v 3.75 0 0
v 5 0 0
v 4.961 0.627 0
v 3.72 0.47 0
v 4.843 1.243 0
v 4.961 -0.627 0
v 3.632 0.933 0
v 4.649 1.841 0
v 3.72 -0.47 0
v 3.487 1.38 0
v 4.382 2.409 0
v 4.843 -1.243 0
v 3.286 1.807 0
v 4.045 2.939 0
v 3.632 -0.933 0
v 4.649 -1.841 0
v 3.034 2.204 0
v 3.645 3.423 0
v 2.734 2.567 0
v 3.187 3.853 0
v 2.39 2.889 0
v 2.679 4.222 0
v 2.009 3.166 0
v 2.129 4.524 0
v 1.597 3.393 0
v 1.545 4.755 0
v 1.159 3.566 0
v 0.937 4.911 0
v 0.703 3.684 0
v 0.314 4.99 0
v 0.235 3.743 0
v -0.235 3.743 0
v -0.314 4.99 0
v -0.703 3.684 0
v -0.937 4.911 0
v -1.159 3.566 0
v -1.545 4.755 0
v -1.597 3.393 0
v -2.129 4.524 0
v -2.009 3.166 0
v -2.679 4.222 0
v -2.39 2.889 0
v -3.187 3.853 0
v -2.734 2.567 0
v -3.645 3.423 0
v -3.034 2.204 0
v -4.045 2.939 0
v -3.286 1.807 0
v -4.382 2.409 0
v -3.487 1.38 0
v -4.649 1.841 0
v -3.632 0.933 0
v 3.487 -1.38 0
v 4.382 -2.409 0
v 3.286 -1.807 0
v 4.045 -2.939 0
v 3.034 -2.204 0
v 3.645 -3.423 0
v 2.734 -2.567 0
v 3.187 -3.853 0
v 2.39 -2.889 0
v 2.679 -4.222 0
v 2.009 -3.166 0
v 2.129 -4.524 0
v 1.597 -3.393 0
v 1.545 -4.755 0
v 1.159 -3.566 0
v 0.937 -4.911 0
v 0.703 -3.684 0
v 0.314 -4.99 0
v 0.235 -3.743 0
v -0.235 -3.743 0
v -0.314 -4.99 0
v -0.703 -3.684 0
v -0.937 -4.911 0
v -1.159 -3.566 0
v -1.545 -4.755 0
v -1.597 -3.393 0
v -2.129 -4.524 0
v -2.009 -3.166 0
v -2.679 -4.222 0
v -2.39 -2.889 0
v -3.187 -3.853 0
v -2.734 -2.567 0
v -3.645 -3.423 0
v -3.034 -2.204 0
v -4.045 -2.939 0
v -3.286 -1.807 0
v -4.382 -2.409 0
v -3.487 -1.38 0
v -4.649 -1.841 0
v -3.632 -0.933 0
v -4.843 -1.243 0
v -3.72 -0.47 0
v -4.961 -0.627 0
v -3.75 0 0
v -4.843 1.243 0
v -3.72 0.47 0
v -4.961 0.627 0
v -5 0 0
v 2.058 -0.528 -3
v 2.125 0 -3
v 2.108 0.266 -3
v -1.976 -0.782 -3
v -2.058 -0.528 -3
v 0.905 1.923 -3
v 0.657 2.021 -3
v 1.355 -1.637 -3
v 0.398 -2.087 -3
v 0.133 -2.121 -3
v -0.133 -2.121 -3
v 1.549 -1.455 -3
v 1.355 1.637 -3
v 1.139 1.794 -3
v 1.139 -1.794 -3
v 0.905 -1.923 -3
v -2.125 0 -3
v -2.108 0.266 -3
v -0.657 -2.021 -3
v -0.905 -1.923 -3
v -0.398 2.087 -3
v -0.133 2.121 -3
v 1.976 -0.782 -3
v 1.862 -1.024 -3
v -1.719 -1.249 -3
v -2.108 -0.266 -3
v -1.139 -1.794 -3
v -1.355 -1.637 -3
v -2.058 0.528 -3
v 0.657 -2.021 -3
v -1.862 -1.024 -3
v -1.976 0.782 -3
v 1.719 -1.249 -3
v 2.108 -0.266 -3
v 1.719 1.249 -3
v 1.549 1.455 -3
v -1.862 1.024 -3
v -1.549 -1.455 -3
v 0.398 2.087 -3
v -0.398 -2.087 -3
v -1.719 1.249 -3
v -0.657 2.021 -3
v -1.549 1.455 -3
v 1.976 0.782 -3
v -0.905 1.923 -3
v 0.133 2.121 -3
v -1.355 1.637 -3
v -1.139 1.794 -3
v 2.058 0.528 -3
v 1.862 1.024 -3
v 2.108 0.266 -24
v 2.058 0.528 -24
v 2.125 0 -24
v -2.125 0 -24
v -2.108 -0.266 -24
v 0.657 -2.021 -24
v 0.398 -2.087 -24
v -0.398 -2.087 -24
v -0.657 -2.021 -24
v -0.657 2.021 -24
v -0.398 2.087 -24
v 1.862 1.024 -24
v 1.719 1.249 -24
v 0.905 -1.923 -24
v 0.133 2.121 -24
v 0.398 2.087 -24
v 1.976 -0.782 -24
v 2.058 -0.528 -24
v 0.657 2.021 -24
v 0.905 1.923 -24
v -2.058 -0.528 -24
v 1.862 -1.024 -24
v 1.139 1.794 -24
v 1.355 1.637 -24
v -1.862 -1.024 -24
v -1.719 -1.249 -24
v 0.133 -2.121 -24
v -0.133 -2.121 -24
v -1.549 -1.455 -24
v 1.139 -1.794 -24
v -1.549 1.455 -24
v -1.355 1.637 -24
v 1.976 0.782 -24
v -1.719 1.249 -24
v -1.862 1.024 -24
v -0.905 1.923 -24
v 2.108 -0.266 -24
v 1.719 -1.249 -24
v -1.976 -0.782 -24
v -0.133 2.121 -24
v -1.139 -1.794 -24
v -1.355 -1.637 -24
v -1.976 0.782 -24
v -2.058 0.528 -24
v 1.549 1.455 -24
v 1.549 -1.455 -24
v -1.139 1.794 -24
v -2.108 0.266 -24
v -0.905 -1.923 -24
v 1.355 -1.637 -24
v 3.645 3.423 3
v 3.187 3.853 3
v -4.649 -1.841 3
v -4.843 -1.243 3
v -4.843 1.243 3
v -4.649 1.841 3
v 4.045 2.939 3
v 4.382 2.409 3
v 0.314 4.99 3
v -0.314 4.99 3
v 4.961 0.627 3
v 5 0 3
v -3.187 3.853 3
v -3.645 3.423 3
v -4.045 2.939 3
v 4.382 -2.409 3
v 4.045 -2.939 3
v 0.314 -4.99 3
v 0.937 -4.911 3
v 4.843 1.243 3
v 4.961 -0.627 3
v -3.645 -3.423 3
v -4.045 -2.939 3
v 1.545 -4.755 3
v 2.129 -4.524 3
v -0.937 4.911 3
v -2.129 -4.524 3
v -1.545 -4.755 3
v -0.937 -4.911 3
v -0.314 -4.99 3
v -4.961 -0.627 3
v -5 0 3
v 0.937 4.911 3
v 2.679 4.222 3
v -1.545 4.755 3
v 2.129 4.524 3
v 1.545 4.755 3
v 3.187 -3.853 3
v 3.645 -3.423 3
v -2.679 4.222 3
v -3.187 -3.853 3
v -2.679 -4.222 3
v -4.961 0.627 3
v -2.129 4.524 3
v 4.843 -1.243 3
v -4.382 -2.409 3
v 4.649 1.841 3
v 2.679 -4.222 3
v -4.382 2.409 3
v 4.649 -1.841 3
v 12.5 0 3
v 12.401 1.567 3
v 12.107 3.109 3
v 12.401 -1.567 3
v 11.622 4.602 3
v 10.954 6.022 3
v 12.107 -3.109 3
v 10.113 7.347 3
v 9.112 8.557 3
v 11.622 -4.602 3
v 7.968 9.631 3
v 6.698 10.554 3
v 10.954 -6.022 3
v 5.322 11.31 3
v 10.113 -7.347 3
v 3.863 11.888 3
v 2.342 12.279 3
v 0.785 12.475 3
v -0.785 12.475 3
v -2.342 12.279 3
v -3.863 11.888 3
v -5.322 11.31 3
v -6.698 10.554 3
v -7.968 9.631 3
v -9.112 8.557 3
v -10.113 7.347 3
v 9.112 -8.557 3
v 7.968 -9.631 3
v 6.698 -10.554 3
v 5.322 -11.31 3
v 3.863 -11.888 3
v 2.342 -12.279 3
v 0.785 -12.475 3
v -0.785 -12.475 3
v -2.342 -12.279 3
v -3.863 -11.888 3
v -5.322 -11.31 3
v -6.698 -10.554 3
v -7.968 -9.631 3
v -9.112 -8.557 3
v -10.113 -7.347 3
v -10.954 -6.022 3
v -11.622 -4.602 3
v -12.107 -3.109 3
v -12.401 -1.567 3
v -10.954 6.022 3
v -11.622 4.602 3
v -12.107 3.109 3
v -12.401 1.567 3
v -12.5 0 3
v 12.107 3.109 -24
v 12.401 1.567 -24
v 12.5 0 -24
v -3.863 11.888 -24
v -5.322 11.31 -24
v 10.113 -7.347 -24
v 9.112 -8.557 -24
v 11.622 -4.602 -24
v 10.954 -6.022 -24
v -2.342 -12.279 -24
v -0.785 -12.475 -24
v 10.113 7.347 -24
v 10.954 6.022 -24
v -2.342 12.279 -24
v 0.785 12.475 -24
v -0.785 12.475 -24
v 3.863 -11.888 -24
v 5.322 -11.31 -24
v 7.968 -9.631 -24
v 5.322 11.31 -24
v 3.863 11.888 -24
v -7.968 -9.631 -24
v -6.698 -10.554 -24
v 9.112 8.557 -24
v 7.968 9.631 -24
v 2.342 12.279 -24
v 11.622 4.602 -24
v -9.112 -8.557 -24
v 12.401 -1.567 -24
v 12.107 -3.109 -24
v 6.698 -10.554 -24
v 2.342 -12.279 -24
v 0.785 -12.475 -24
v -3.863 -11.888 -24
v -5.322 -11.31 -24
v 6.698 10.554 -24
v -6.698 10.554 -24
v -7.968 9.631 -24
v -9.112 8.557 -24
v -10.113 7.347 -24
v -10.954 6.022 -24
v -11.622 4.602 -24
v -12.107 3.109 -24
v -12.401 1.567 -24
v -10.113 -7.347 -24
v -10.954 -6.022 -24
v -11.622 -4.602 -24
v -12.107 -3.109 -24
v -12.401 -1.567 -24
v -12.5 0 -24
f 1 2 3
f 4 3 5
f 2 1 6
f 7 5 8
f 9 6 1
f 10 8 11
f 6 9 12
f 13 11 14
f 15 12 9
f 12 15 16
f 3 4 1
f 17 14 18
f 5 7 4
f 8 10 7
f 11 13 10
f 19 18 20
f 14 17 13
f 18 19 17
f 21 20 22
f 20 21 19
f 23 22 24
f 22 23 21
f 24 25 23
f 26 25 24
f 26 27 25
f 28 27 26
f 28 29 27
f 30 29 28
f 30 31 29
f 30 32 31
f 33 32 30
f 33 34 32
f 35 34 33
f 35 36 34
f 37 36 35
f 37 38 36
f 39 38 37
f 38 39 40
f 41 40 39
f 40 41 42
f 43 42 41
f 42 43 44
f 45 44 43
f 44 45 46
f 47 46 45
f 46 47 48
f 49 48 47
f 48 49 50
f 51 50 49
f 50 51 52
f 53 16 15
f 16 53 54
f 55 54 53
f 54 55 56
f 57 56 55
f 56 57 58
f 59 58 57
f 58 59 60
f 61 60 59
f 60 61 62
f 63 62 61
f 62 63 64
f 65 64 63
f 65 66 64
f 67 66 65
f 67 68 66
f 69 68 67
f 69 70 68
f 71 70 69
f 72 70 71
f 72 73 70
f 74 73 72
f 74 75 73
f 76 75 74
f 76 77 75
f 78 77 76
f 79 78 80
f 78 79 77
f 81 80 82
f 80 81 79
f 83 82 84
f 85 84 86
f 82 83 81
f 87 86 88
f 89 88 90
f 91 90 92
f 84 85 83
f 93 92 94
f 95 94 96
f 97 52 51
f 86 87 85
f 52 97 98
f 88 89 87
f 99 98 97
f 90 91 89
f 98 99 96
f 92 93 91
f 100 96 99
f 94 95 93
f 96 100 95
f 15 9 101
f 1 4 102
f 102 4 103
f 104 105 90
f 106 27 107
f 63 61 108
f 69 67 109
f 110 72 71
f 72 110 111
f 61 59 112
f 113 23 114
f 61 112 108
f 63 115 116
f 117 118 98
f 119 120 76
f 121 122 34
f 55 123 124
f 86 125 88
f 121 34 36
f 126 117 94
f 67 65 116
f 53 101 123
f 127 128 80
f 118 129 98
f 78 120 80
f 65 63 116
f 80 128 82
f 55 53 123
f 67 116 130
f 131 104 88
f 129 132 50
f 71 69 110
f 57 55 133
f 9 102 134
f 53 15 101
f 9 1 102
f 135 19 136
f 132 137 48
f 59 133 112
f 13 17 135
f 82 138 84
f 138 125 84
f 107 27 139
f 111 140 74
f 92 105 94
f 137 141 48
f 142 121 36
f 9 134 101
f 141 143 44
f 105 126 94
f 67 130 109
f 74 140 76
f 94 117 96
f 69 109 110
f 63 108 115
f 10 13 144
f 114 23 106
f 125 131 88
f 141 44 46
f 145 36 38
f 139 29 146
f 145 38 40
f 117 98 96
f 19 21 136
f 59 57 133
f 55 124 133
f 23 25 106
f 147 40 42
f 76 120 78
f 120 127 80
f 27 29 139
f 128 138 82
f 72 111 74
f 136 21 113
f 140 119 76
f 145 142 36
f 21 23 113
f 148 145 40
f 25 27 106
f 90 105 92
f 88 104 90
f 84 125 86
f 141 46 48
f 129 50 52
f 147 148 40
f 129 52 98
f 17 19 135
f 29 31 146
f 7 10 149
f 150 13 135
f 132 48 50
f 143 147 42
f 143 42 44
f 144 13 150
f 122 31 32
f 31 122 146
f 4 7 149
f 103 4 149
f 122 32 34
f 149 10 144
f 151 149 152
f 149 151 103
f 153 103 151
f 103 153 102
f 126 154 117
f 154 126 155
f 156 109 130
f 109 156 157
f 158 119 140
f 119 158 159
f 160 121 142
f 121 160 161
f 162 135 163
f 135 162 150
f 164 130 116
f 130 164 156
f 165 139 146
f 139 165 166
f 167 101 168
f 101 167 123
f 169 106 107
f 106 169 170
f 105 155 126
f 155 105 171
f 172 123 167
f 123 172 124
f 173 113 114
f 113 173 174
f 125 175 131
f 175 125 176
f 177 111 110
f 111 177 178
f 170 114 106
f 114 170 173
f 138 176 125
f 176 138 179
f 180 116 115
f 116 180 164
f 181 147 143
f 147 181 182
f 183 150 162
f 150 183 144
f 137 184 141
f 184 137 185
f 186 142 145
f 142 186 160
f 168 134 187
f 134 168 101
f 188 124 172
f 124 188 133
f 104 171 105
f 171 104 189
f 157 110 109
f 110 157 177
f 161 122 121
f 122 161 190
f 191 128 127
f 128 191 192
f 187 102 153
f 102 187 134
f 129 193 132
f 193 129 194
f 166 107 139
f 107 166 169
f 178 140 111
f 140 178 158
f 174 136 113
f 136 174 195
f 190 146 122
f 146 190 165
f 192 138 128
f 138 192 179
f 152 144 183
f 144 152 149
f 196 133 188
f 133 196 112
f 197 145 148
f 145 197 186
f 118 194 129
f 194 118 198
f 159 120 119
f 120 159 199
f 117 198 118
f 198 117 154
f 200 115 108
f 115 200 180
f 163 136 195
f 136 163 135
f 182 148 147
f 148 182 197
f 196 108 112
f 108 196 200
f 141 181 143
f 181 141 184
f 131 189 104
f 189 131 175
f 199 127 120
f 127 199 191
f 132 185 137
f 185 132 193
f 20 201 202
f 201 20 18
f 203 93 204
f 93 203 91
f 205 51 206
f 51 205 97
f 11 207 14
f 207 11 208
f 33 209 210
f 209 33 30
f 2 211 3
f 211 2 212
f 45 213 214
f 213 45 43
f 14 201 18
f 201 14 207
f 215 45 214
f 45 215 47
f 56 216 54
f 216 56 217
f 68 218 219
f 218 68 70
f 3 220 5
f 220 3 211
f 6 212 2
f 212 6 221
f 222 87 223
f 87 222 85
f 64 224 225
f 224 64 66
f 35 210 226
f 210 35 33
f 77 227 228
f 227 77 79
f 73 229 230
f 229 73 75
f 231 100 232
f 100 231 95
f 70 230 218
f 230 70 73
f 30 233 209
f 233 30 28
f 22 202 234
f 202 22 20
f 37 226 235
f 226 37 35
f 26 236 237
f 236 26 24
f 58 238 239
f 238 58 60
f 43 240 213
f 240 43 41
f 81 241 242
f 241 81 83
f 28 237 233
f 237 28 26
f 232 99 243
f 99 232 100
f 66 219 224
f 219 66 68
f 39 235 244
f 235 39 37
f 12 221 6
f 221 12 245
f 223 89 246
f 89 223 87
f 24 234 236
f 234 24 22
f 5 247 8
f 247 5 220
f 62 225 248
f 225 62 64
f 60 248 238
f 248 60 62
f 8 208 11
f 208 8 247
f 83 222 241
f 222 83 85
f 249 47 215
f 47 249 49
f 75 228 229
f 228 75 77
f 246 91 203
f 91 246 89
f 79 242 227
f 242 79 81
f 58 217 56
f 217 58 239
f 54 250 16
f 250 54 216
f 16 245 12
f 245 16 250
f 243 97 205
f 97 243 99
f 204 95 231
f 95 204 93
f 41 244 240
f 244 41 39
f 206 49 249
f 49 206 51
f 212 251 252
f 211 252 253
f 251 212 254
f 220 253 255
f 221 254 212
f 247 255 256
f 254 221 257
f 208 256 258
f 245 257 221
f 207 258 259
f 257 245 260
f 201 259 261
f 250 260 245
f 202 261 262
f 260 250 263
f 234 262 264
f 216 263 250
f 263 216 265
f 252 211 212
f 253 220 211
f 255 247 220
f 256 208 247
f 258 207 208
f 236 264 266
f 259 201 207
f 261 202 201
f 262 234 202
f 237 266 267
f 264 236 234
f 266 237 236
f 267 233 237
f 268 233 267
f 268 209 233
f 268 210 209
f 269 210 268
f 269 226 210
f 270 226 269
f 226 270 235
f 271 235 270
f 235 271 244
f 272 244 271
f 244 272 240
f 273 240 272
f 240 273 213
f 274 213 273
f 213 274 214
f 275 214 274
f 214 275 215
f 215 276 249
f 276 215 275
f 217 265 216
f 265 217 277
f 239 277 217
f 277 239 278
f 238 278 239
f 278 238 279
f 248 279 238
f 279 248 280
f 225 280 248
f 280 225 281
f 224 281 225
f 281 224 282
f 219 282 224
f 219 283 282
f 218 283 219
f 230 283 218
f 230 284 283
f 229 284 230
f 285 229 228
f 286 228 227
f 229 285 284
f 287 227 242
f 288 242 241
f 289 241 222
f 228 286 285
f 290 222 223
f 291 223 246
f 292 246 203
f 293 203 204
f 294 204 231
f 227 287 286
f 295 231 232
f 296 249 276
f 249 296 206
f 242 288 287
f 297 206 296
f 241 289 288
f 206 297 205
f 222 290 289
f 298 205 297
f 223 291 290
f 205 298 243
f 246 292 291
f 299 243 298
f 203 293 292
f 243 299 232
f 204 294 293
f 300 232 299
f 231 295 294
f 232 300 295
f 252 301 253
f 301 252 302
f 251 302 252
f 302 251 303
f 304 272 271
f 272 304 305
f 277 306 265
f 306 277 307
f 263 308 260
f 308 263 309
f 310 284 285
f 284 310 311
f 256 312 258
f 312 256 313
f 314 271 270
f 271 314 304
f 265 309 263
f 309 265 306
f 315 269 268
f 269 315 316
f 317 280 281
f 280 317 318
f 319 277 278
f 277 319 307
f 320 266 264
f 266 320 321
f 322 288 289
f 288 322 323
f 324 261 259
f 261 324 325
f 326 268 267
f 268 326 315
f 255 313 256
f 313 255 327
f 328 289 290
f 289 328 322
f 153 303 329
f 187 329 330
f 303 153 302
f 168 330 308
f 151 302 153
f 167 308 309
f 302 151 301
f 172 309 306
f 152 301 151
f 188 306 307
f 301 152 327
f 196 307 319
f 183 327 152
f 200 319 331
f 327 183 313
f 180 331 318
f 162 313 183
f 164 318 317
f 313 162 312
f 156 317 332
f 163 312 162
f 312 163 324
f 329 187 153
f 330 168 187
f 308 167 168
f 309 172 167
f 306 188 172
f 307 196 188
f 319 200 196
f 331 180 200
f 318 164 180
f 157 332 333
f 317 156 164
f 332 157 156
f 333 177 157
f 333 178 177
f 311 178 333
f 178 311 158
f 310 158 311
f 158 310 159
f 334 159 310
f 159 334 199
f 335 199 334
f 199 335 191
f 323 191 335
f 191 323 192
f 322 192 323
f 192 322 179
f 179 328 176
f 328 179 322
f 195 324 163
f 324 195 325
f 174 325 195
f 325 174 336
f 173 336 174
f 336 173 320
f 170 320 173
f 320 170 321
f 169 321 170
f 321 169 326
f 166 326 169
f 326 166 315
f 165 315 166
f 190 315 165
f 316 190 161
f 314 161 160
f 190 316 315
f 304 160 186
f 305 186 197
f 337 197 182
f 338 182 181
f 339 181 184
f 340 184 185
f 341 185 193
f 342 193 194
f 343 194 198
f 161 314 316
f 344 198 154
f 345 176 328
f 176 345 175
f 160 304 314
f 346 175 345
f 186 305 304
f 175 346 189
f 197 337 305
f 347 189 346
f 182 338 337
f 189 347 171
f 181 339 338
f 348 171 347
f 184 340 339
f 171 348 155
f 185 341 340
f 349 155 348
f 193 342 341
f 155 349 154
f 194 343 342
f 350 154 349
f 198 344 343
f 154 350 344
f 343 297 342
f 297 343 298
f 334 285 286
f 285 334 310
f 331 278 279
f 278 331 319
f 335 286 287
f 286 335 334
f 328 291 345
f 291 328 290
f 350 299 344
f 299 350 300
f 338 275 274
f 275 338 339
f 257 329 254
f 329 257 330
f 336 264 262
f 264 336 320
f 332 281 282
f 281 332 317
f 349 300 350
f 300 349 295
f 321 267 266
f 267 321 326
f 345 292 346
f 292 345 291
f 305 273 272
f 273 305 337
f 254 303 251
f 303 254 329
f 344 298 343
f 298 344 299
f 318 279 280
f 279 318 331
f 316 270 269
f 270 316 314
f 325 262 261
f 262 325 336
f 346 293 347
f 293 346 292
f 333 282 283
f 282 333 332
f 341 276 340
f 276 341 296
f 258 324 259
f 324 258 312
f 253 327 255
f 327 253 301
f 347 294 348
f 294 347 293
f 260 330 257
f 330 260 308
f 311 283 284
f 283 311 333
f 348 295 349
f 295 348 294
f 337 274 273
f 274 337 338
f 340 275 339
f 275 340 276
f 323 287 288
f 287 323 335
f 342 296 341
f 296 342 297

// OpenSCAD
$fn = 50;

difference() {
	union() {
		translate(v = [0, 0, -24.0]) {
			cylinder(h = 27, r = 12.5);
		}
	}
	union() {
		translate(v = [0, 0, 0]) {
			rotate(a = [0, 0, 0]) {
				difference() {
					union() {
						translate(v = [0, 0, -27.0]) {
							cylinder(h = 27, r = 2.0);
						}
						translate(v = [0, 0, -3]) {
							cylinder(h = 3, r1 = 2.125, r2 = 3.75);
						}
						translate(v = [0, 0, -27.0]) {
							cylinder(h = 27, r = 2.125);
						}
						translate(v = [0, 0, -27.0]) {
							cylinder(h = 27, r = 2.0);
						}
					}
					union();
				}
			}
		}
		#cylinder(h = 3, r = 5.0);
	}
}
